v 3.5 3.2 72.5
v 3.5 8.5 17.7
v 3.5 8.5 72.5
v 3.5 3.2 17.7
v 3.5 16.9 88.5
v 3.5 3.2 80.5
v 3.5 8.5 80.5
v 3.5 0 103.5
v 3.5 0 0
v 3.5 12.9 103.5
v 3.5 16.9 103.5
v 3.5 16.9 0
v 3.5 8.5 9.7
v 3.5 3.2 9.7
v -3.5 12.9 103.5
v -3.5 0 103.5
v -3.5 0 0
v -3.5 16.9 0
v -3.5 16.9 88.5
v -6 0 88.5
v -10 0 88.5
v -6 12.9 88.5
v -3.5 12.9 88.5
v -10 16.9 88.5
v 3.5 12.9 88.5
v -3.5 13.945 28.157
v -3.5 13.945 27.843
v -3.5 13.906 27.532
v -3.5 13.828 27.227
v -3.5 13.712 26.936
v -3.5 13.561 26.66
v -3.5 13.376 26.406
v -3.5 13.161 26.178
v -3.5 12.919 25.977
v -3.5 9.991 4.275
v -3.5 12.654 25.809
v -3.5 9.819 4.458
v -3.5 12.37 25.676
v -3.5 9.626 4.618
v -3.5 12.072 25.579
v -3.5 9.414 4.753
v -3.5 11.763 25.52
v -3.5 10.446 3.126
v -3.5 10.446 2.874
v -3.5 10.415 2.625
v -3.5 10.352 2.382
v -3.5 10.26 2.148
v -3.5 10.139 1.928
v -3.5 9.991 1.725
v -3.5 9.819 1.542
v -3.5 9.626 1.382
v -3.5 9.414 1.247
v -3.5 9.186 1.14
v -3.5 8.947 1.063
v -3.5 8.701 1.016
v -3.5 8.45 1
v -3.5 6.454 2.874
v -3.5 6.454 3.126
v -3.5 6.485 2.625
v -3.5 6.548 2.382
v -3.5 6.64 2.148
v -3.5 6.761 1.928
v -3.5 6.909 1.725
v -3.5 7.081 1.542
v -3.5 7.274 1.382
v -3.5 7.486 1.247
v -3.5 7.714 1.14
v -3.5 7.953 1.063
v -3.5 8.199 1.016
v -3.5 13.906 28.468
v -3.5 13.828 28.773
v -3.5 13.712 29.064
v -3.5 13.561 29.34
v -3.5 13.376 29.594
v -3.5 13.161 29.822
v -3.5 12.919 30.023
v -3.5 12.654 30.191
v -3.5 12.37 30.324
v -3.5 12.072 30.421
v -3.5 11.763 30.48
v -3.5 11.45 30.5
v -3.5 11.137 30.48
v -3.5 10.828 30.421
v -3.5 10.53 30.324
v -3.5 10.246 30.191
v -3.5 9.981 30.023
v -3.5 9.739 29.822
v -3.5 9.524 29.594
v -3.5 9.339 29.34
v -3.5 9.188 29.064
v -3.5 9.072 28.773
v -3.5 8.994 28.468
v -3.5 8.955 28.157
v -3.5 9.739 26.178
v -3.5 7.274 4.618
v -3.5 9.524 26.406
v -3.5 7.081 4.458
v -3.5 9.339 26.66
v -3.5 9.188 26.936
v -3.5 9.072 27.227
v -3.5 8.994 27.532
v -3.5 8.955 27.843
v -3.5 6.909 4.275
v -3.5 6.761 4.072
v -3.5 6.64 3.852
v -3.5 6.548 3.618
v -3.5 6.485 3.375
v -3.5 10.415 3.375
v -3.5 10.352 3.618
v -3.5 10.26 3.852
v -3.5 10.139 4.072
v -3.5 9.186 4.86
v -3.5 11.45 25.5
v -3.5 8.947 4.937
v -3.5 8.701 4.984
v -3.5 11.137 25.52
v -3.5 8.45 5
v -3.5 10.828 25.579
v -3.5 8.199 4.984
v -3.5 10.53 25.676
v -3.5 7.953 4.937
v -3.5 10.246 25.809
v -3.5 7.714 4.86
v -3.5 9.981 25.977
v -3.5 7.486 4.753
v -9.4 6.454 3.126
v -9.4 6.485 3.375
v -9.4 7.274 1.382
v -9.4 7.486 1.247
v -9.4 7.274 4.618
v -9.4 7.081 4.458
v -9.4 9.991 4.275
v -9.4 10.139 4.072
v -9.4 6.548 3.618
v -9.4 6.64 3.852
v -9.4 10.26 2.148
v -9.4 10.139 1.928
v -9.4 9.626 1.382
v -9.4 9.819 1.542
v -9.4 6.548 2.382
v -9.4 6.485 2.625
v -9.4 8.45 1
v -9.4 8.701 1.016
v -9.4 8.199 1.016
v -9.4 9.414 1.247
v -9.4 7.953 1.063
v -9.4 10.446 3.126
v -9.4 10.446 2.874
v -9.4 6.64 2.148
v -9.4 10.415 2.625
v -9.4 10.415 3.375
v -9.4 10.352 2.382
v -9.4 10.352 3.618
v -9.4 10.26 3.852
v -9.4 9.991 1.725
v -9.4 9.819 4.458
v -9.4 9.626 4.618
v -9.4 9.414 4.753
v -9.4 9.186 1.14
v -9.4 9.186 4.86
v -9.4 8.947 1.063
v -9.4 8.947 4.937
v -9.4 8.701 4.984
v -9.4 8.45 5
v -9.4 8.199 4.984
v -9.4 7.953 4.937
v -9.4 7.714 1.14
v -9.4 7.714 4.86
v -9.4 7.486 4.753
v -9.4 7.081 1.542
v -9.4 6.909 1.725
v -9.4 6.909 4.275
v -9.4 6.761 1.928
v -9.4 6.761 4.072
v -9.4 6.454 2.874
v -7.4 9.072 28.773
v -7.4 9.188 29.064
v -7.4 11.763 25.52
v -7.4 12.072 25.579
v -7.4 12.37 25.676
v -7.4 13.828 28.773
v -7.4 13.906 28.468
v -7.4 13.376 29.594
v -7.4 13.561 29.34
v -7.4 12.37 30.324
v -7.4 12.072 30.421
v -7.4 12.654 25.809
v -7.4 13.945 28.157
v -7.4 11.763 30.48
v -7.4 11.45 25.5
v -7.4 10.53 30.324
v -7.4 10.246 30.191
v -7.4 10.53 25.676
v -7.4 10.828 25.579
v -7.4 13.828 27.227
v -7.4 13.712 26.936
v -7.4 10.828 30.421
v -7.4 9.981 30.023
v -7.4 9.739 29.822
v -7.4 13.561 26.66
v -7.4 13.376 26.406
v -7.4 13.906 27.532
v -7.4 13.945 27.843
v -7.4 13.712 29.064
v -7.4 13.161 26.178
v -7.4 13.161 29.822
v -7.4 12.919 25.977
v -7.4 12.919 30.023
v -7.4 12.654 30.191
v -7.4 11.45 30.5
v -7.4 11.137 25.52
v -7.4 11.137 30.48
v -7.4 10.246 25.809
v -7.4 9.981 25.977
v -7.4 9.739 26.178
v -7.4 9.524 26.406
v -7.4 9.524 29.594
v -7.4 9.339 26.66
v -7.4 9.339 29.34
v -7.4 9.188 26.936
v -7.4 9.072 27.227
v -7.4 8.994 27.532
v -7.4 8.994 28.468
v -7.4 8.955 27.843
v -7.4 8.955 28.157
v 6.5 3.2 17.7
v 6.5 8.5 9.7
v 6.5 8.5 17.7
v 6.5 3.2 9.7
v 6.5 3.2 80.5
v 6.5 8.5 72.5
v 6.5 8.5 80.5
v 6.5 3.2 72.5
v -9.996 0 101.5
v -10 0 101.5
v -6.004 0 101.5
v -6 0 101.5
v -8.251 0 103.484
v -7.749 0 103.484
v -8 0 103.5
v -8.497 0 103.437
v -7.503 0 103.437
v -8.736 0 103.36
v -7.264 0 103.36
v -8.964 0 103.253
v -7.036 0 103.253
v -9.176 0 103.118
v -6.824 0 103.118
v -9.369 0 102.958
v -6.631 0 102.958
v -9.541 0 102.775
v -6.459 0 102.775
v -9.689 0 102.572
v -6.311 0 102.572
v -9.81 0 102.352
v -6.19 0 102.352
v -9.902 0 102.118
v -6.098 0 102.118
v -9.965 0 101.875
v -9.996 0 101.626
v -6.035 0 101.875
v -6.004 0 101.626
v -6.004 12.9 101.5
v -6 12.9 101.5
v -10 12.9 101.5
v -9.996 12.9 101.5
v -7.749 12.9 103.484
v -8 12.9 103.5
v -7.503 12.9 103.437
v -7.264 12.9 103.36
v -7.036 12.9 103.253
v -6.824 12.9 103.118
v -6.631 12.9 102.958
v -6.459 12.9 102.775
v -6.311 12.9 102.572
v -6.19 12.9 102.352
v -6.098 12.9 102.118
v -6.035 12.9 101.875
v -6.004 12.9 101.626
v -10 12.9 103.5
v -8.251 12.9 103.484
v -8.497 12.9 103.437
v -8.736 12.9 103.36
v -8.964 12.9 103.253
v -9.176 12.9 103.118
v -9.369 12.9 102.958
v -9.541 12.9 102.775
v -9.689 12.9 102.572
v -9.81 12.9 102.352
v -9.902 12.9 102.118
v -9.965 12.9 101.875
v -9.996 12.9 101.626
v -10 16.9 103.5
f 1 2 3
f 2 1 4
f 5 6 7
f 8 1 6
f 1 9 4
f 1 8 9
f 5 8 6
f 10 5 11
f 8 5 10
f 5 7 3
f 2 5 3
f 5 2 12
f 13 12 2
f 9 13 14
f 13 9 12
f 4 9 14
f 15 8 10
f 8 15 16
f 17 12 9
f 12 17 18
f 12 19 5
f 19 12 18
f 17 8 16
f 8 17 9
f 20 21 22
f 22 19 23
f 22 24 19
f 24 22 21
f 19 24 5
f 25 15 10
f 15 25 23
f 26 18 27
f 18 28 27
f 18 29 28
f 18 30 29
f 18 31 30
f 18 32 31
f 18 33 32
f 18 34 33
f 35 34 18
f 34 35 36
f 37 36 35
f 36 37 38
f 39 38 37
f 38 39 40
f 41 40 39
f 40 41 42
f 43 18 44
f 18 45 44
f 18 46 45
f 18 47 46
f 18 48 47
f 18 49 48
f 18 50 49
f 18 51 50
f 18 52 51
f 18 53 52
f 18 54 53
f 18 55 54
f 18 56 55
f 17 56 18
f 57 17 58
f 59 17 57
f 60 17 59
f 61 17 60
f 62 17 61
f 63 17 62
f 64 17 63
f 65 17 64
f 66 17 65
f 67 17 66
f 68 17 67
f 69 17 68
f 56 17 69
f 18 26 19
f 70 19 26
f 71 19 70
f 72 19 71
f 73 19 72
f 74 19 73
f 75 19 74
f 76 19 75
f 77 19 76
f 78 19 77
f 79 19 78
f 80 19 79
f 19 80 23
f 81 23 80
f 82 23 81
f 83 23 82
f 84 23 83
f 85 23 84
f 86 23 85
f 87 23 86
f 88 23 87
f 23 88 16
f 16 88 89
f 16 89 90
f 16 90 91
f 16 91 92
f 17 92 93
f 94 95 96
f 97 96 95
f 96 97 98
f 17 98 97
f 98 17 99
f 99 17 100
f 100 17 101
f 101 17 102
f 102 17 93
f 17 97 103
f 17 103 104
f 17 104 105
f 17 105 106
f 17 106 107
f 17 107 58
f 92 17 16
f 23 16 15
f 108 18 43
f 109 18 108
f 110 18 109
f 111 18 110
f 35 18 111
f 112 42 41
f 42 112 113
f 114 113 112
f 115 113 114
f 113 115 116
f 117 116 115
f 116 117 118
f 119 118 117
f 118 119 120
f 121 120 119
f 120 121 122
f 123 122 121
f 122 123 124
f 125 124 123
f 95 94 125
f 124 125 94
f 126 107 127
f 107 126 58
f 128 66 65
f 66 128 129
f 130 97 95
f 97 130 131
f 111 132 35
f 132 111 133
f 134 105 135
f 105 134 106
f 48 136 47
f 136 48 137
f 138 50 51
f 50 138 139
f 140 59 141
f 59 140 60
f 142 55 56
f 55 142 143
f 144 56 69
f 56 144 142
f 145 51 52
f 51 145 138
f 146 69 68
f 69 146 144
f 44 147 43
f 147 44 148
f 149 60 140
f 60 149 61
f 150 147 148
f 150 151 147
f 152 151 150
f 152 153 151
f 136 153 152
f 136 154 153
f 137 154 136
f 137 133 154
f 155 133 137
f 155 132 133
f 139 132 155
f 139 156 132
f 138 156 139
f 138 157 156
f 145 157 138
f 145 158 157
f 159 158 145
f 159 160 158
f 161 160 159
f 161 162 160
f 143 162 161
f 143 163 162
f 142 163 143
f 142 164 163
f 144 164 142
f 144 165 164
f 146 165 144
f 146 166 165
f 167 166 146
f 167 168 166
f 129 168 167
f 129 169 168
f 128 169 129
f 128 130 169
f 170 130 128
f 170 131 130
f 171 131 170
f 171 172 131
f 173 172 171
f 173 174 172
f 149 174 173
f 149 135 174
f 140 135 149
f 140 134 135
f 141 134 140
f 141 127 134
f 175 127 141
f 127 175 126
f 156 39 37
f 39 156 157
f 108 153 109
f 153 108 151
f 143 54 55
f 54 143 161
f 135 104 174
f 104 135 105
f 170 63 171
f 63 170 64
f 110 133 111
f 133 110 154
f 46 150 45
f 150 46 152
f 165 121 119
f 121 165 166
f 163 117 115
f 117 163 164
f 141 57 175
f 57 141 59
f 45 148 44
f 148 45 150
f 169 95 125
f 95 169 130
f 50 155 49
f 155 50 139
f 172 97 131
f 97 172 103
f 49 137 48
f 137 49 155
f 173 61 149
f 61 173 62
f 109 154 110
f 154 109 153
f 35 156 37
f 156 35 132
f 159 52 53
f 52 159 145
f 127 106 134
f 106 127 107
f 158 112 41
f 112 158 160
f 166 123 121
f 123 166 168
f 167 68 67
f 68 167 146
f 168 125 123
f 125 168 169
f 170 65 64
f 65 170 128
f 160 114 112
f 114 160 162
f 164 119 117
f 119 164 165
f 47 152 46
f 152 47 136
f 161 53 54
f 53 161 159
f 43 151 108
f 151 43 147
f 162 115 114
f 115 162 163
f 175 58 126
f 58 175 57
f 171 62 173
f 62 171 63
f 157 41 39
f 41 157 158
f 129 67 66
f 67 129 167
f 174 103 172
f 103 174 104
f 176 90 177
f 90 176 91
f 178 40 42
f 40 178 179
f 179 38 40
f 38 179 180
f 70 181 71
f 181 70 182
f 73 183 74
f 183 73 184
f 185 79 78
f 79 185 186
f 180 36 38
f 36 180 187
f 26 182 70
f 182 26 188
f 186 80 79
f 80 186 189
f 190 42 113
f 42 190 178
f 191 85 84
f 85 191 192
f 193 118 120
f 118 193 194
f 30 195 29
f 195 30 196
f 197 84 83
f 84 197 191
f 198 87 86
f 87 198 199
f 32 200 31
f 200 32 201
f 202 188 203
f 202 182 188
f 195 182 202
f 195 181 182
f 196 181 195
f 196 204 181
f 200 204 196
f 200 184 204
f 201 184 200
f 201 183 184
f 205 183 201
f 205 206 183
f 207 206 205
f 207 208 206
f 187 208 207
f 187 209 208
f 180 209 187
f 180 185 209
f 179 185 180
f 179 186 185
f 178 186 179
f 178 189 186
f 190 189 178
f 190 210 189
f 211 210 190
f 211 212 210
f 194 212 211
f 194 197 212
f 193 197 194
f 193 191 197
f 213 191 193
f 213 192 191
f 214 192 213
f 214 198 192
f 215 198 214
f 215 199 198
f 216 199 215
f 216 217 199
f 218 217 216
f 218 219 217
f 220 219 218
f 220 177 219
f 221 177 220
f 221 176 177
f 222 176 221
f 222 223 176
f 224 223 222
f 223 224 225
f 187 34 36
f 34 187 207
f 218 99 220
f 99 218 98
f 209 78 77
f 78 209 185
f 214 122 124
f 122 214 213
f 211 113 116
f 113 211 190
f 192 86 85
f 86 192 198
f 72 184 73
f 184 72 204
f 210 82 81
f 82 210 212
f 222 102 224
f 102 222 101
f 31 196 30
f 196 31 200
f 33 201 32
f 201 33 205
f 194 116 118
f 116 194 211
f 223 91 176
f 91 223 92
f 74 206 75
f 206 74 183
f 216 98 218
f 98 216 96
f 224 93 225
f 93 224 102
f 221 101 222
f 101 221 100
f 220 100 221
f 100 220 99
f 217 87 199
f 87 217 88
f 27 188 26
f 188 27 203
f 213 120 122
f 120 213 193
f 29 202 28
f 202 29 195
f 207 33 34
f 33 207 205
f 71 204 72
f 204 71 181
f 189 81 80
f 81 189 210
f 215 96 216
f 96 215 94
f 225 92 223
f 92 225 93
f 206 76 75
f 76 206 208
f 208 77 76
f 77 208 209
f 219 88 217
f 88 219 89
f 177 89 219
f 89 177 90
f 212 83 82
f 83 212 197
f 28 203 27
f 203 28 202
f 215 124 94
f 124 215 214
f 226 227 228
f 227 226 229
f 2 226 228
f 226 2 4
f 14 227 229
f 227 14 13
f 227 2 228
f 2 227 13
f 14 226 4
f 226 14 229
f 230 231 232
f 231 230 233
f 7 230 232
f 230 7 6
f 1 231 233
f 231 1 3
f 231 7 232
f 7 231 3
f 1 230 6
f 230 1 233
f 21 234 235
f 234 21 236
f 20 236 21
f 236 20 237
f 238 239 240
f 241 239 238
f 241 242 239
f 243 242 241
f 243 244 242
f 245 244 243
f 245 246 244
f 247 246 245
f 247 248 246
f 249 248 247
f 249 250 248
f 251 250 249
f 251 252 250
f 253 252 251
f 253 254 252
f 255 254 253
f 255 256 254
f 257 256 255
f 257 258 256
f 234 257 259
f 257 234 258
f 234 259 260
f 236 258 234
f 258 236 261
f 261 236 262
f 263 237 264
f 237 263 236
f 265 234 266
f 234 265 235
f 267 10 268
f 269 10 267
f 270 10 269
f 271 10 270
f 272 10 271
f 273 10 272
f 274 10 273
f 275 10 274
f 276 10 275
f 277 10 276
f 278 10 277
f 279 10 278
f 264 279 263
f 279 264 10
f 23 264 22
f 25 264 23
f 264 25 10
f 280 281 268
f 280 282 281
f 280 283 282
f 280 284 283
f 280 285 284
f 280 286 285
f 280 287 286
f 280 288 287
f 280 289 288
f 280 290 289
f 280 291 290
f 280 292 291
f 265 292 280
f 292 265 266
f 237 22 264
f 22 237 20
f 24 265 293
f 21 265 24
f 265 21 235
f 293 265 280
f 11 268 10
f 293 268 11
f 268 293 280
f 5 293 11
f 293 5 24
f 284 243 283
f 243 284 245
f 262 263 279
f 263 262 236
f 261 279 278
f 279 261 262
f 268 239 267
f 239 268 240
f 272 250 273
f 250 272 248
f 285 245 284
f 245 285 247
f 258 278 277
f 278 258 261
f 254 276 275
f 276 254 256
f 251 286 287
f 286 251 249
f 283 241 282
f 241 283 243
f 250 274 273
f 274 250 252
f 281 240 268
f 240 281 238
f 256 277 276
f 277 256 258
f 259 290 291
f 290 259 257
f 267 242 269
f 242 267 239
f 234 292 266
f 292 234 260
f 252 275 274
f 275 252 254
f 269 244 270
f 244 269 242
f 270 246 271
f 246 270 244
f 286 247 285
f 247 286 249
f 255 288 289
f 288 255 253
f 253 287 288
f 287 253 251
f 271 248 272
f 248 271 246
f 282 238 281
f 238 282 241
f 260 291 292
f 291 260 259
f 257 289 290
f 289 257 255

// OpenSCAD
// file: Adapter_onglet.scad
include <Adapter_config.scad>;

module adaptateur_onglet_droit()
{
    rect3_sx = adaptateur_pf-onglet_ep;
    rect3_sy = onglet_ep;
    rect3_sz = onglet_ht-onglet_ep/2;
    rect3_x = onglet_ep;
    rect3_y = 0;
    rect3_z = 0;

    rect4_sx = onglet_ep;
    rect4_sy = adaptateur_ep*2 + onglet_ep + onglet_ec;
    rect4_sz = onglet_ht;
    rect4_x = 0;
    rect4_y = 0;
    rect4_z = 0;

    cyl1_dm = onglet_ep;
    cyl1_ht = rect3_sx;

    union()
    {
        color("green")
        translate([rect3_x, rect3_y, rect3_z])
        cube([rect3_sx, rect3_sy, rect3_sz]);
        
        color("red")
        translate([rect4_x, rect4_y, rect4_z])
        cube([rect4_sx, rect4_sy, rect4_sz]);
        
        color("blue")
        translate([onglet_ep,onglet_ep/2,rect3_sz])
        rotate([0,90,0])
        cylinder(d=cyl1_dm, h=cyl1_ht);
    }
}

adaptateur_onglet_droit();
// file: Adapter_right_ext.scad
include <Adapter_config.scad>;

module adaptateur_droit_ext()
{
    rect1_sx = 3;
    rect1_sy = 5.3;
    rect1_sz = 8;
    rect1_att_ht = 9.7;
    rect1_att_dc = -2.6;

    rect2_sx = 3;
    rect2_sy = 5.3;
    rect2_sz = 8;
    rect2_att_ht = 72.5;
    rect2_att_dc = -2.6;

    union()
    {
        difference()
        {
            cube([adaptateur_ep, adaptateur_pf, adaptateur_ht]);
            
            color("orange")
            translate([-0.1,adaptateur_pf-onglet_ep,adaptateur_ht-onglet_ht])
            cube([adaptateur_ep+0.2,onglet_ep+0.1,onglet_ht+0.1]);
        }
        translate([adaptateur_ep, adaptateur_pf/2-rect1_sy/2+rect1_att_dc, rect1_att_ht])
        cube([rect1_sx, rect1_sy, rect1_sz]);
        
        translate([adaptateur_ep, adaptateur_pf/2-rect2_sy/2+rect2_att_dc, rect2_att_ht])
        cube([rect2_sx, rect2_sy, rect2_sz]);
    }
}

adaptateur_droit_ext();
// file: Adapter_right_int.scad
include <Adapter_config.scad>;

module adaptateur_droit_int()
{
    cyl1_dm = 4;
    cyl1_ht = 6;
    cyl1_att_ht = 3;
    cyl1_att_dc = 0;

    cyl2_dm = 5;
    cyl2_ht = 4;
    cyl2_att_ht = 28;
    cyl2_att_dc = 3;

    union()
    {
        difference()
        {
            cube([adaptateur_ep, adaptateur_pf, adaptateur_ht]);
            
            color("orange")
            translate([-0.1,adaptateur_pf-onglet_ep,adaptateur_ht-onglet_ht])
            cube([adaptateur_ep+0.2,onglet_ep+0.1,onglet_ht+0.1]);
        }
        
        color("black")
        translate([-cyl1_ht+0.1,adaptateur_pf/2+cyl1_att_dc,cyl1_att_ht])
        rotate([0,90,0])
        cylinder(d=cyl1_dm, h=cyl1_ht);
        
        color("blue")
        translate([-cyl2_ht+0.1,adaptateur_pf/2+cyl2_att_dc,cyl2_att_ht])
        rotate([0,90,0])
        cylinder(d=cyl2_dm, h=cyl2_ht);
    }
}

adaptateur_droit_int();
// file: Adapter_config.scad
adaptateur_ep = (300.5-286.5)/4;
adaptateur_ht = 103.5;
adaptateur_pf = 16.90;

onglet_ht = 15;
onglet_ep = 4;
onglet_ec = 2.5;

$fn = 50;
// main file
include <Adapter_config.scad>;

use <Adapter_right_int.scad>
use <Adapter_right_ext.scad>
use <Adapter_onglet.scad>

translate([-adaptateur_ep,0,0])
adaptateur_droit_int();

adaptateur_droit_ext();

translate([-(adaptateur_ep + onglet_ep + onglet_ec),adaptateur_pf,adaptateur_ht-onglet_ht])
rotate([0,0,-90])
adaptateur_onglet_droit();
